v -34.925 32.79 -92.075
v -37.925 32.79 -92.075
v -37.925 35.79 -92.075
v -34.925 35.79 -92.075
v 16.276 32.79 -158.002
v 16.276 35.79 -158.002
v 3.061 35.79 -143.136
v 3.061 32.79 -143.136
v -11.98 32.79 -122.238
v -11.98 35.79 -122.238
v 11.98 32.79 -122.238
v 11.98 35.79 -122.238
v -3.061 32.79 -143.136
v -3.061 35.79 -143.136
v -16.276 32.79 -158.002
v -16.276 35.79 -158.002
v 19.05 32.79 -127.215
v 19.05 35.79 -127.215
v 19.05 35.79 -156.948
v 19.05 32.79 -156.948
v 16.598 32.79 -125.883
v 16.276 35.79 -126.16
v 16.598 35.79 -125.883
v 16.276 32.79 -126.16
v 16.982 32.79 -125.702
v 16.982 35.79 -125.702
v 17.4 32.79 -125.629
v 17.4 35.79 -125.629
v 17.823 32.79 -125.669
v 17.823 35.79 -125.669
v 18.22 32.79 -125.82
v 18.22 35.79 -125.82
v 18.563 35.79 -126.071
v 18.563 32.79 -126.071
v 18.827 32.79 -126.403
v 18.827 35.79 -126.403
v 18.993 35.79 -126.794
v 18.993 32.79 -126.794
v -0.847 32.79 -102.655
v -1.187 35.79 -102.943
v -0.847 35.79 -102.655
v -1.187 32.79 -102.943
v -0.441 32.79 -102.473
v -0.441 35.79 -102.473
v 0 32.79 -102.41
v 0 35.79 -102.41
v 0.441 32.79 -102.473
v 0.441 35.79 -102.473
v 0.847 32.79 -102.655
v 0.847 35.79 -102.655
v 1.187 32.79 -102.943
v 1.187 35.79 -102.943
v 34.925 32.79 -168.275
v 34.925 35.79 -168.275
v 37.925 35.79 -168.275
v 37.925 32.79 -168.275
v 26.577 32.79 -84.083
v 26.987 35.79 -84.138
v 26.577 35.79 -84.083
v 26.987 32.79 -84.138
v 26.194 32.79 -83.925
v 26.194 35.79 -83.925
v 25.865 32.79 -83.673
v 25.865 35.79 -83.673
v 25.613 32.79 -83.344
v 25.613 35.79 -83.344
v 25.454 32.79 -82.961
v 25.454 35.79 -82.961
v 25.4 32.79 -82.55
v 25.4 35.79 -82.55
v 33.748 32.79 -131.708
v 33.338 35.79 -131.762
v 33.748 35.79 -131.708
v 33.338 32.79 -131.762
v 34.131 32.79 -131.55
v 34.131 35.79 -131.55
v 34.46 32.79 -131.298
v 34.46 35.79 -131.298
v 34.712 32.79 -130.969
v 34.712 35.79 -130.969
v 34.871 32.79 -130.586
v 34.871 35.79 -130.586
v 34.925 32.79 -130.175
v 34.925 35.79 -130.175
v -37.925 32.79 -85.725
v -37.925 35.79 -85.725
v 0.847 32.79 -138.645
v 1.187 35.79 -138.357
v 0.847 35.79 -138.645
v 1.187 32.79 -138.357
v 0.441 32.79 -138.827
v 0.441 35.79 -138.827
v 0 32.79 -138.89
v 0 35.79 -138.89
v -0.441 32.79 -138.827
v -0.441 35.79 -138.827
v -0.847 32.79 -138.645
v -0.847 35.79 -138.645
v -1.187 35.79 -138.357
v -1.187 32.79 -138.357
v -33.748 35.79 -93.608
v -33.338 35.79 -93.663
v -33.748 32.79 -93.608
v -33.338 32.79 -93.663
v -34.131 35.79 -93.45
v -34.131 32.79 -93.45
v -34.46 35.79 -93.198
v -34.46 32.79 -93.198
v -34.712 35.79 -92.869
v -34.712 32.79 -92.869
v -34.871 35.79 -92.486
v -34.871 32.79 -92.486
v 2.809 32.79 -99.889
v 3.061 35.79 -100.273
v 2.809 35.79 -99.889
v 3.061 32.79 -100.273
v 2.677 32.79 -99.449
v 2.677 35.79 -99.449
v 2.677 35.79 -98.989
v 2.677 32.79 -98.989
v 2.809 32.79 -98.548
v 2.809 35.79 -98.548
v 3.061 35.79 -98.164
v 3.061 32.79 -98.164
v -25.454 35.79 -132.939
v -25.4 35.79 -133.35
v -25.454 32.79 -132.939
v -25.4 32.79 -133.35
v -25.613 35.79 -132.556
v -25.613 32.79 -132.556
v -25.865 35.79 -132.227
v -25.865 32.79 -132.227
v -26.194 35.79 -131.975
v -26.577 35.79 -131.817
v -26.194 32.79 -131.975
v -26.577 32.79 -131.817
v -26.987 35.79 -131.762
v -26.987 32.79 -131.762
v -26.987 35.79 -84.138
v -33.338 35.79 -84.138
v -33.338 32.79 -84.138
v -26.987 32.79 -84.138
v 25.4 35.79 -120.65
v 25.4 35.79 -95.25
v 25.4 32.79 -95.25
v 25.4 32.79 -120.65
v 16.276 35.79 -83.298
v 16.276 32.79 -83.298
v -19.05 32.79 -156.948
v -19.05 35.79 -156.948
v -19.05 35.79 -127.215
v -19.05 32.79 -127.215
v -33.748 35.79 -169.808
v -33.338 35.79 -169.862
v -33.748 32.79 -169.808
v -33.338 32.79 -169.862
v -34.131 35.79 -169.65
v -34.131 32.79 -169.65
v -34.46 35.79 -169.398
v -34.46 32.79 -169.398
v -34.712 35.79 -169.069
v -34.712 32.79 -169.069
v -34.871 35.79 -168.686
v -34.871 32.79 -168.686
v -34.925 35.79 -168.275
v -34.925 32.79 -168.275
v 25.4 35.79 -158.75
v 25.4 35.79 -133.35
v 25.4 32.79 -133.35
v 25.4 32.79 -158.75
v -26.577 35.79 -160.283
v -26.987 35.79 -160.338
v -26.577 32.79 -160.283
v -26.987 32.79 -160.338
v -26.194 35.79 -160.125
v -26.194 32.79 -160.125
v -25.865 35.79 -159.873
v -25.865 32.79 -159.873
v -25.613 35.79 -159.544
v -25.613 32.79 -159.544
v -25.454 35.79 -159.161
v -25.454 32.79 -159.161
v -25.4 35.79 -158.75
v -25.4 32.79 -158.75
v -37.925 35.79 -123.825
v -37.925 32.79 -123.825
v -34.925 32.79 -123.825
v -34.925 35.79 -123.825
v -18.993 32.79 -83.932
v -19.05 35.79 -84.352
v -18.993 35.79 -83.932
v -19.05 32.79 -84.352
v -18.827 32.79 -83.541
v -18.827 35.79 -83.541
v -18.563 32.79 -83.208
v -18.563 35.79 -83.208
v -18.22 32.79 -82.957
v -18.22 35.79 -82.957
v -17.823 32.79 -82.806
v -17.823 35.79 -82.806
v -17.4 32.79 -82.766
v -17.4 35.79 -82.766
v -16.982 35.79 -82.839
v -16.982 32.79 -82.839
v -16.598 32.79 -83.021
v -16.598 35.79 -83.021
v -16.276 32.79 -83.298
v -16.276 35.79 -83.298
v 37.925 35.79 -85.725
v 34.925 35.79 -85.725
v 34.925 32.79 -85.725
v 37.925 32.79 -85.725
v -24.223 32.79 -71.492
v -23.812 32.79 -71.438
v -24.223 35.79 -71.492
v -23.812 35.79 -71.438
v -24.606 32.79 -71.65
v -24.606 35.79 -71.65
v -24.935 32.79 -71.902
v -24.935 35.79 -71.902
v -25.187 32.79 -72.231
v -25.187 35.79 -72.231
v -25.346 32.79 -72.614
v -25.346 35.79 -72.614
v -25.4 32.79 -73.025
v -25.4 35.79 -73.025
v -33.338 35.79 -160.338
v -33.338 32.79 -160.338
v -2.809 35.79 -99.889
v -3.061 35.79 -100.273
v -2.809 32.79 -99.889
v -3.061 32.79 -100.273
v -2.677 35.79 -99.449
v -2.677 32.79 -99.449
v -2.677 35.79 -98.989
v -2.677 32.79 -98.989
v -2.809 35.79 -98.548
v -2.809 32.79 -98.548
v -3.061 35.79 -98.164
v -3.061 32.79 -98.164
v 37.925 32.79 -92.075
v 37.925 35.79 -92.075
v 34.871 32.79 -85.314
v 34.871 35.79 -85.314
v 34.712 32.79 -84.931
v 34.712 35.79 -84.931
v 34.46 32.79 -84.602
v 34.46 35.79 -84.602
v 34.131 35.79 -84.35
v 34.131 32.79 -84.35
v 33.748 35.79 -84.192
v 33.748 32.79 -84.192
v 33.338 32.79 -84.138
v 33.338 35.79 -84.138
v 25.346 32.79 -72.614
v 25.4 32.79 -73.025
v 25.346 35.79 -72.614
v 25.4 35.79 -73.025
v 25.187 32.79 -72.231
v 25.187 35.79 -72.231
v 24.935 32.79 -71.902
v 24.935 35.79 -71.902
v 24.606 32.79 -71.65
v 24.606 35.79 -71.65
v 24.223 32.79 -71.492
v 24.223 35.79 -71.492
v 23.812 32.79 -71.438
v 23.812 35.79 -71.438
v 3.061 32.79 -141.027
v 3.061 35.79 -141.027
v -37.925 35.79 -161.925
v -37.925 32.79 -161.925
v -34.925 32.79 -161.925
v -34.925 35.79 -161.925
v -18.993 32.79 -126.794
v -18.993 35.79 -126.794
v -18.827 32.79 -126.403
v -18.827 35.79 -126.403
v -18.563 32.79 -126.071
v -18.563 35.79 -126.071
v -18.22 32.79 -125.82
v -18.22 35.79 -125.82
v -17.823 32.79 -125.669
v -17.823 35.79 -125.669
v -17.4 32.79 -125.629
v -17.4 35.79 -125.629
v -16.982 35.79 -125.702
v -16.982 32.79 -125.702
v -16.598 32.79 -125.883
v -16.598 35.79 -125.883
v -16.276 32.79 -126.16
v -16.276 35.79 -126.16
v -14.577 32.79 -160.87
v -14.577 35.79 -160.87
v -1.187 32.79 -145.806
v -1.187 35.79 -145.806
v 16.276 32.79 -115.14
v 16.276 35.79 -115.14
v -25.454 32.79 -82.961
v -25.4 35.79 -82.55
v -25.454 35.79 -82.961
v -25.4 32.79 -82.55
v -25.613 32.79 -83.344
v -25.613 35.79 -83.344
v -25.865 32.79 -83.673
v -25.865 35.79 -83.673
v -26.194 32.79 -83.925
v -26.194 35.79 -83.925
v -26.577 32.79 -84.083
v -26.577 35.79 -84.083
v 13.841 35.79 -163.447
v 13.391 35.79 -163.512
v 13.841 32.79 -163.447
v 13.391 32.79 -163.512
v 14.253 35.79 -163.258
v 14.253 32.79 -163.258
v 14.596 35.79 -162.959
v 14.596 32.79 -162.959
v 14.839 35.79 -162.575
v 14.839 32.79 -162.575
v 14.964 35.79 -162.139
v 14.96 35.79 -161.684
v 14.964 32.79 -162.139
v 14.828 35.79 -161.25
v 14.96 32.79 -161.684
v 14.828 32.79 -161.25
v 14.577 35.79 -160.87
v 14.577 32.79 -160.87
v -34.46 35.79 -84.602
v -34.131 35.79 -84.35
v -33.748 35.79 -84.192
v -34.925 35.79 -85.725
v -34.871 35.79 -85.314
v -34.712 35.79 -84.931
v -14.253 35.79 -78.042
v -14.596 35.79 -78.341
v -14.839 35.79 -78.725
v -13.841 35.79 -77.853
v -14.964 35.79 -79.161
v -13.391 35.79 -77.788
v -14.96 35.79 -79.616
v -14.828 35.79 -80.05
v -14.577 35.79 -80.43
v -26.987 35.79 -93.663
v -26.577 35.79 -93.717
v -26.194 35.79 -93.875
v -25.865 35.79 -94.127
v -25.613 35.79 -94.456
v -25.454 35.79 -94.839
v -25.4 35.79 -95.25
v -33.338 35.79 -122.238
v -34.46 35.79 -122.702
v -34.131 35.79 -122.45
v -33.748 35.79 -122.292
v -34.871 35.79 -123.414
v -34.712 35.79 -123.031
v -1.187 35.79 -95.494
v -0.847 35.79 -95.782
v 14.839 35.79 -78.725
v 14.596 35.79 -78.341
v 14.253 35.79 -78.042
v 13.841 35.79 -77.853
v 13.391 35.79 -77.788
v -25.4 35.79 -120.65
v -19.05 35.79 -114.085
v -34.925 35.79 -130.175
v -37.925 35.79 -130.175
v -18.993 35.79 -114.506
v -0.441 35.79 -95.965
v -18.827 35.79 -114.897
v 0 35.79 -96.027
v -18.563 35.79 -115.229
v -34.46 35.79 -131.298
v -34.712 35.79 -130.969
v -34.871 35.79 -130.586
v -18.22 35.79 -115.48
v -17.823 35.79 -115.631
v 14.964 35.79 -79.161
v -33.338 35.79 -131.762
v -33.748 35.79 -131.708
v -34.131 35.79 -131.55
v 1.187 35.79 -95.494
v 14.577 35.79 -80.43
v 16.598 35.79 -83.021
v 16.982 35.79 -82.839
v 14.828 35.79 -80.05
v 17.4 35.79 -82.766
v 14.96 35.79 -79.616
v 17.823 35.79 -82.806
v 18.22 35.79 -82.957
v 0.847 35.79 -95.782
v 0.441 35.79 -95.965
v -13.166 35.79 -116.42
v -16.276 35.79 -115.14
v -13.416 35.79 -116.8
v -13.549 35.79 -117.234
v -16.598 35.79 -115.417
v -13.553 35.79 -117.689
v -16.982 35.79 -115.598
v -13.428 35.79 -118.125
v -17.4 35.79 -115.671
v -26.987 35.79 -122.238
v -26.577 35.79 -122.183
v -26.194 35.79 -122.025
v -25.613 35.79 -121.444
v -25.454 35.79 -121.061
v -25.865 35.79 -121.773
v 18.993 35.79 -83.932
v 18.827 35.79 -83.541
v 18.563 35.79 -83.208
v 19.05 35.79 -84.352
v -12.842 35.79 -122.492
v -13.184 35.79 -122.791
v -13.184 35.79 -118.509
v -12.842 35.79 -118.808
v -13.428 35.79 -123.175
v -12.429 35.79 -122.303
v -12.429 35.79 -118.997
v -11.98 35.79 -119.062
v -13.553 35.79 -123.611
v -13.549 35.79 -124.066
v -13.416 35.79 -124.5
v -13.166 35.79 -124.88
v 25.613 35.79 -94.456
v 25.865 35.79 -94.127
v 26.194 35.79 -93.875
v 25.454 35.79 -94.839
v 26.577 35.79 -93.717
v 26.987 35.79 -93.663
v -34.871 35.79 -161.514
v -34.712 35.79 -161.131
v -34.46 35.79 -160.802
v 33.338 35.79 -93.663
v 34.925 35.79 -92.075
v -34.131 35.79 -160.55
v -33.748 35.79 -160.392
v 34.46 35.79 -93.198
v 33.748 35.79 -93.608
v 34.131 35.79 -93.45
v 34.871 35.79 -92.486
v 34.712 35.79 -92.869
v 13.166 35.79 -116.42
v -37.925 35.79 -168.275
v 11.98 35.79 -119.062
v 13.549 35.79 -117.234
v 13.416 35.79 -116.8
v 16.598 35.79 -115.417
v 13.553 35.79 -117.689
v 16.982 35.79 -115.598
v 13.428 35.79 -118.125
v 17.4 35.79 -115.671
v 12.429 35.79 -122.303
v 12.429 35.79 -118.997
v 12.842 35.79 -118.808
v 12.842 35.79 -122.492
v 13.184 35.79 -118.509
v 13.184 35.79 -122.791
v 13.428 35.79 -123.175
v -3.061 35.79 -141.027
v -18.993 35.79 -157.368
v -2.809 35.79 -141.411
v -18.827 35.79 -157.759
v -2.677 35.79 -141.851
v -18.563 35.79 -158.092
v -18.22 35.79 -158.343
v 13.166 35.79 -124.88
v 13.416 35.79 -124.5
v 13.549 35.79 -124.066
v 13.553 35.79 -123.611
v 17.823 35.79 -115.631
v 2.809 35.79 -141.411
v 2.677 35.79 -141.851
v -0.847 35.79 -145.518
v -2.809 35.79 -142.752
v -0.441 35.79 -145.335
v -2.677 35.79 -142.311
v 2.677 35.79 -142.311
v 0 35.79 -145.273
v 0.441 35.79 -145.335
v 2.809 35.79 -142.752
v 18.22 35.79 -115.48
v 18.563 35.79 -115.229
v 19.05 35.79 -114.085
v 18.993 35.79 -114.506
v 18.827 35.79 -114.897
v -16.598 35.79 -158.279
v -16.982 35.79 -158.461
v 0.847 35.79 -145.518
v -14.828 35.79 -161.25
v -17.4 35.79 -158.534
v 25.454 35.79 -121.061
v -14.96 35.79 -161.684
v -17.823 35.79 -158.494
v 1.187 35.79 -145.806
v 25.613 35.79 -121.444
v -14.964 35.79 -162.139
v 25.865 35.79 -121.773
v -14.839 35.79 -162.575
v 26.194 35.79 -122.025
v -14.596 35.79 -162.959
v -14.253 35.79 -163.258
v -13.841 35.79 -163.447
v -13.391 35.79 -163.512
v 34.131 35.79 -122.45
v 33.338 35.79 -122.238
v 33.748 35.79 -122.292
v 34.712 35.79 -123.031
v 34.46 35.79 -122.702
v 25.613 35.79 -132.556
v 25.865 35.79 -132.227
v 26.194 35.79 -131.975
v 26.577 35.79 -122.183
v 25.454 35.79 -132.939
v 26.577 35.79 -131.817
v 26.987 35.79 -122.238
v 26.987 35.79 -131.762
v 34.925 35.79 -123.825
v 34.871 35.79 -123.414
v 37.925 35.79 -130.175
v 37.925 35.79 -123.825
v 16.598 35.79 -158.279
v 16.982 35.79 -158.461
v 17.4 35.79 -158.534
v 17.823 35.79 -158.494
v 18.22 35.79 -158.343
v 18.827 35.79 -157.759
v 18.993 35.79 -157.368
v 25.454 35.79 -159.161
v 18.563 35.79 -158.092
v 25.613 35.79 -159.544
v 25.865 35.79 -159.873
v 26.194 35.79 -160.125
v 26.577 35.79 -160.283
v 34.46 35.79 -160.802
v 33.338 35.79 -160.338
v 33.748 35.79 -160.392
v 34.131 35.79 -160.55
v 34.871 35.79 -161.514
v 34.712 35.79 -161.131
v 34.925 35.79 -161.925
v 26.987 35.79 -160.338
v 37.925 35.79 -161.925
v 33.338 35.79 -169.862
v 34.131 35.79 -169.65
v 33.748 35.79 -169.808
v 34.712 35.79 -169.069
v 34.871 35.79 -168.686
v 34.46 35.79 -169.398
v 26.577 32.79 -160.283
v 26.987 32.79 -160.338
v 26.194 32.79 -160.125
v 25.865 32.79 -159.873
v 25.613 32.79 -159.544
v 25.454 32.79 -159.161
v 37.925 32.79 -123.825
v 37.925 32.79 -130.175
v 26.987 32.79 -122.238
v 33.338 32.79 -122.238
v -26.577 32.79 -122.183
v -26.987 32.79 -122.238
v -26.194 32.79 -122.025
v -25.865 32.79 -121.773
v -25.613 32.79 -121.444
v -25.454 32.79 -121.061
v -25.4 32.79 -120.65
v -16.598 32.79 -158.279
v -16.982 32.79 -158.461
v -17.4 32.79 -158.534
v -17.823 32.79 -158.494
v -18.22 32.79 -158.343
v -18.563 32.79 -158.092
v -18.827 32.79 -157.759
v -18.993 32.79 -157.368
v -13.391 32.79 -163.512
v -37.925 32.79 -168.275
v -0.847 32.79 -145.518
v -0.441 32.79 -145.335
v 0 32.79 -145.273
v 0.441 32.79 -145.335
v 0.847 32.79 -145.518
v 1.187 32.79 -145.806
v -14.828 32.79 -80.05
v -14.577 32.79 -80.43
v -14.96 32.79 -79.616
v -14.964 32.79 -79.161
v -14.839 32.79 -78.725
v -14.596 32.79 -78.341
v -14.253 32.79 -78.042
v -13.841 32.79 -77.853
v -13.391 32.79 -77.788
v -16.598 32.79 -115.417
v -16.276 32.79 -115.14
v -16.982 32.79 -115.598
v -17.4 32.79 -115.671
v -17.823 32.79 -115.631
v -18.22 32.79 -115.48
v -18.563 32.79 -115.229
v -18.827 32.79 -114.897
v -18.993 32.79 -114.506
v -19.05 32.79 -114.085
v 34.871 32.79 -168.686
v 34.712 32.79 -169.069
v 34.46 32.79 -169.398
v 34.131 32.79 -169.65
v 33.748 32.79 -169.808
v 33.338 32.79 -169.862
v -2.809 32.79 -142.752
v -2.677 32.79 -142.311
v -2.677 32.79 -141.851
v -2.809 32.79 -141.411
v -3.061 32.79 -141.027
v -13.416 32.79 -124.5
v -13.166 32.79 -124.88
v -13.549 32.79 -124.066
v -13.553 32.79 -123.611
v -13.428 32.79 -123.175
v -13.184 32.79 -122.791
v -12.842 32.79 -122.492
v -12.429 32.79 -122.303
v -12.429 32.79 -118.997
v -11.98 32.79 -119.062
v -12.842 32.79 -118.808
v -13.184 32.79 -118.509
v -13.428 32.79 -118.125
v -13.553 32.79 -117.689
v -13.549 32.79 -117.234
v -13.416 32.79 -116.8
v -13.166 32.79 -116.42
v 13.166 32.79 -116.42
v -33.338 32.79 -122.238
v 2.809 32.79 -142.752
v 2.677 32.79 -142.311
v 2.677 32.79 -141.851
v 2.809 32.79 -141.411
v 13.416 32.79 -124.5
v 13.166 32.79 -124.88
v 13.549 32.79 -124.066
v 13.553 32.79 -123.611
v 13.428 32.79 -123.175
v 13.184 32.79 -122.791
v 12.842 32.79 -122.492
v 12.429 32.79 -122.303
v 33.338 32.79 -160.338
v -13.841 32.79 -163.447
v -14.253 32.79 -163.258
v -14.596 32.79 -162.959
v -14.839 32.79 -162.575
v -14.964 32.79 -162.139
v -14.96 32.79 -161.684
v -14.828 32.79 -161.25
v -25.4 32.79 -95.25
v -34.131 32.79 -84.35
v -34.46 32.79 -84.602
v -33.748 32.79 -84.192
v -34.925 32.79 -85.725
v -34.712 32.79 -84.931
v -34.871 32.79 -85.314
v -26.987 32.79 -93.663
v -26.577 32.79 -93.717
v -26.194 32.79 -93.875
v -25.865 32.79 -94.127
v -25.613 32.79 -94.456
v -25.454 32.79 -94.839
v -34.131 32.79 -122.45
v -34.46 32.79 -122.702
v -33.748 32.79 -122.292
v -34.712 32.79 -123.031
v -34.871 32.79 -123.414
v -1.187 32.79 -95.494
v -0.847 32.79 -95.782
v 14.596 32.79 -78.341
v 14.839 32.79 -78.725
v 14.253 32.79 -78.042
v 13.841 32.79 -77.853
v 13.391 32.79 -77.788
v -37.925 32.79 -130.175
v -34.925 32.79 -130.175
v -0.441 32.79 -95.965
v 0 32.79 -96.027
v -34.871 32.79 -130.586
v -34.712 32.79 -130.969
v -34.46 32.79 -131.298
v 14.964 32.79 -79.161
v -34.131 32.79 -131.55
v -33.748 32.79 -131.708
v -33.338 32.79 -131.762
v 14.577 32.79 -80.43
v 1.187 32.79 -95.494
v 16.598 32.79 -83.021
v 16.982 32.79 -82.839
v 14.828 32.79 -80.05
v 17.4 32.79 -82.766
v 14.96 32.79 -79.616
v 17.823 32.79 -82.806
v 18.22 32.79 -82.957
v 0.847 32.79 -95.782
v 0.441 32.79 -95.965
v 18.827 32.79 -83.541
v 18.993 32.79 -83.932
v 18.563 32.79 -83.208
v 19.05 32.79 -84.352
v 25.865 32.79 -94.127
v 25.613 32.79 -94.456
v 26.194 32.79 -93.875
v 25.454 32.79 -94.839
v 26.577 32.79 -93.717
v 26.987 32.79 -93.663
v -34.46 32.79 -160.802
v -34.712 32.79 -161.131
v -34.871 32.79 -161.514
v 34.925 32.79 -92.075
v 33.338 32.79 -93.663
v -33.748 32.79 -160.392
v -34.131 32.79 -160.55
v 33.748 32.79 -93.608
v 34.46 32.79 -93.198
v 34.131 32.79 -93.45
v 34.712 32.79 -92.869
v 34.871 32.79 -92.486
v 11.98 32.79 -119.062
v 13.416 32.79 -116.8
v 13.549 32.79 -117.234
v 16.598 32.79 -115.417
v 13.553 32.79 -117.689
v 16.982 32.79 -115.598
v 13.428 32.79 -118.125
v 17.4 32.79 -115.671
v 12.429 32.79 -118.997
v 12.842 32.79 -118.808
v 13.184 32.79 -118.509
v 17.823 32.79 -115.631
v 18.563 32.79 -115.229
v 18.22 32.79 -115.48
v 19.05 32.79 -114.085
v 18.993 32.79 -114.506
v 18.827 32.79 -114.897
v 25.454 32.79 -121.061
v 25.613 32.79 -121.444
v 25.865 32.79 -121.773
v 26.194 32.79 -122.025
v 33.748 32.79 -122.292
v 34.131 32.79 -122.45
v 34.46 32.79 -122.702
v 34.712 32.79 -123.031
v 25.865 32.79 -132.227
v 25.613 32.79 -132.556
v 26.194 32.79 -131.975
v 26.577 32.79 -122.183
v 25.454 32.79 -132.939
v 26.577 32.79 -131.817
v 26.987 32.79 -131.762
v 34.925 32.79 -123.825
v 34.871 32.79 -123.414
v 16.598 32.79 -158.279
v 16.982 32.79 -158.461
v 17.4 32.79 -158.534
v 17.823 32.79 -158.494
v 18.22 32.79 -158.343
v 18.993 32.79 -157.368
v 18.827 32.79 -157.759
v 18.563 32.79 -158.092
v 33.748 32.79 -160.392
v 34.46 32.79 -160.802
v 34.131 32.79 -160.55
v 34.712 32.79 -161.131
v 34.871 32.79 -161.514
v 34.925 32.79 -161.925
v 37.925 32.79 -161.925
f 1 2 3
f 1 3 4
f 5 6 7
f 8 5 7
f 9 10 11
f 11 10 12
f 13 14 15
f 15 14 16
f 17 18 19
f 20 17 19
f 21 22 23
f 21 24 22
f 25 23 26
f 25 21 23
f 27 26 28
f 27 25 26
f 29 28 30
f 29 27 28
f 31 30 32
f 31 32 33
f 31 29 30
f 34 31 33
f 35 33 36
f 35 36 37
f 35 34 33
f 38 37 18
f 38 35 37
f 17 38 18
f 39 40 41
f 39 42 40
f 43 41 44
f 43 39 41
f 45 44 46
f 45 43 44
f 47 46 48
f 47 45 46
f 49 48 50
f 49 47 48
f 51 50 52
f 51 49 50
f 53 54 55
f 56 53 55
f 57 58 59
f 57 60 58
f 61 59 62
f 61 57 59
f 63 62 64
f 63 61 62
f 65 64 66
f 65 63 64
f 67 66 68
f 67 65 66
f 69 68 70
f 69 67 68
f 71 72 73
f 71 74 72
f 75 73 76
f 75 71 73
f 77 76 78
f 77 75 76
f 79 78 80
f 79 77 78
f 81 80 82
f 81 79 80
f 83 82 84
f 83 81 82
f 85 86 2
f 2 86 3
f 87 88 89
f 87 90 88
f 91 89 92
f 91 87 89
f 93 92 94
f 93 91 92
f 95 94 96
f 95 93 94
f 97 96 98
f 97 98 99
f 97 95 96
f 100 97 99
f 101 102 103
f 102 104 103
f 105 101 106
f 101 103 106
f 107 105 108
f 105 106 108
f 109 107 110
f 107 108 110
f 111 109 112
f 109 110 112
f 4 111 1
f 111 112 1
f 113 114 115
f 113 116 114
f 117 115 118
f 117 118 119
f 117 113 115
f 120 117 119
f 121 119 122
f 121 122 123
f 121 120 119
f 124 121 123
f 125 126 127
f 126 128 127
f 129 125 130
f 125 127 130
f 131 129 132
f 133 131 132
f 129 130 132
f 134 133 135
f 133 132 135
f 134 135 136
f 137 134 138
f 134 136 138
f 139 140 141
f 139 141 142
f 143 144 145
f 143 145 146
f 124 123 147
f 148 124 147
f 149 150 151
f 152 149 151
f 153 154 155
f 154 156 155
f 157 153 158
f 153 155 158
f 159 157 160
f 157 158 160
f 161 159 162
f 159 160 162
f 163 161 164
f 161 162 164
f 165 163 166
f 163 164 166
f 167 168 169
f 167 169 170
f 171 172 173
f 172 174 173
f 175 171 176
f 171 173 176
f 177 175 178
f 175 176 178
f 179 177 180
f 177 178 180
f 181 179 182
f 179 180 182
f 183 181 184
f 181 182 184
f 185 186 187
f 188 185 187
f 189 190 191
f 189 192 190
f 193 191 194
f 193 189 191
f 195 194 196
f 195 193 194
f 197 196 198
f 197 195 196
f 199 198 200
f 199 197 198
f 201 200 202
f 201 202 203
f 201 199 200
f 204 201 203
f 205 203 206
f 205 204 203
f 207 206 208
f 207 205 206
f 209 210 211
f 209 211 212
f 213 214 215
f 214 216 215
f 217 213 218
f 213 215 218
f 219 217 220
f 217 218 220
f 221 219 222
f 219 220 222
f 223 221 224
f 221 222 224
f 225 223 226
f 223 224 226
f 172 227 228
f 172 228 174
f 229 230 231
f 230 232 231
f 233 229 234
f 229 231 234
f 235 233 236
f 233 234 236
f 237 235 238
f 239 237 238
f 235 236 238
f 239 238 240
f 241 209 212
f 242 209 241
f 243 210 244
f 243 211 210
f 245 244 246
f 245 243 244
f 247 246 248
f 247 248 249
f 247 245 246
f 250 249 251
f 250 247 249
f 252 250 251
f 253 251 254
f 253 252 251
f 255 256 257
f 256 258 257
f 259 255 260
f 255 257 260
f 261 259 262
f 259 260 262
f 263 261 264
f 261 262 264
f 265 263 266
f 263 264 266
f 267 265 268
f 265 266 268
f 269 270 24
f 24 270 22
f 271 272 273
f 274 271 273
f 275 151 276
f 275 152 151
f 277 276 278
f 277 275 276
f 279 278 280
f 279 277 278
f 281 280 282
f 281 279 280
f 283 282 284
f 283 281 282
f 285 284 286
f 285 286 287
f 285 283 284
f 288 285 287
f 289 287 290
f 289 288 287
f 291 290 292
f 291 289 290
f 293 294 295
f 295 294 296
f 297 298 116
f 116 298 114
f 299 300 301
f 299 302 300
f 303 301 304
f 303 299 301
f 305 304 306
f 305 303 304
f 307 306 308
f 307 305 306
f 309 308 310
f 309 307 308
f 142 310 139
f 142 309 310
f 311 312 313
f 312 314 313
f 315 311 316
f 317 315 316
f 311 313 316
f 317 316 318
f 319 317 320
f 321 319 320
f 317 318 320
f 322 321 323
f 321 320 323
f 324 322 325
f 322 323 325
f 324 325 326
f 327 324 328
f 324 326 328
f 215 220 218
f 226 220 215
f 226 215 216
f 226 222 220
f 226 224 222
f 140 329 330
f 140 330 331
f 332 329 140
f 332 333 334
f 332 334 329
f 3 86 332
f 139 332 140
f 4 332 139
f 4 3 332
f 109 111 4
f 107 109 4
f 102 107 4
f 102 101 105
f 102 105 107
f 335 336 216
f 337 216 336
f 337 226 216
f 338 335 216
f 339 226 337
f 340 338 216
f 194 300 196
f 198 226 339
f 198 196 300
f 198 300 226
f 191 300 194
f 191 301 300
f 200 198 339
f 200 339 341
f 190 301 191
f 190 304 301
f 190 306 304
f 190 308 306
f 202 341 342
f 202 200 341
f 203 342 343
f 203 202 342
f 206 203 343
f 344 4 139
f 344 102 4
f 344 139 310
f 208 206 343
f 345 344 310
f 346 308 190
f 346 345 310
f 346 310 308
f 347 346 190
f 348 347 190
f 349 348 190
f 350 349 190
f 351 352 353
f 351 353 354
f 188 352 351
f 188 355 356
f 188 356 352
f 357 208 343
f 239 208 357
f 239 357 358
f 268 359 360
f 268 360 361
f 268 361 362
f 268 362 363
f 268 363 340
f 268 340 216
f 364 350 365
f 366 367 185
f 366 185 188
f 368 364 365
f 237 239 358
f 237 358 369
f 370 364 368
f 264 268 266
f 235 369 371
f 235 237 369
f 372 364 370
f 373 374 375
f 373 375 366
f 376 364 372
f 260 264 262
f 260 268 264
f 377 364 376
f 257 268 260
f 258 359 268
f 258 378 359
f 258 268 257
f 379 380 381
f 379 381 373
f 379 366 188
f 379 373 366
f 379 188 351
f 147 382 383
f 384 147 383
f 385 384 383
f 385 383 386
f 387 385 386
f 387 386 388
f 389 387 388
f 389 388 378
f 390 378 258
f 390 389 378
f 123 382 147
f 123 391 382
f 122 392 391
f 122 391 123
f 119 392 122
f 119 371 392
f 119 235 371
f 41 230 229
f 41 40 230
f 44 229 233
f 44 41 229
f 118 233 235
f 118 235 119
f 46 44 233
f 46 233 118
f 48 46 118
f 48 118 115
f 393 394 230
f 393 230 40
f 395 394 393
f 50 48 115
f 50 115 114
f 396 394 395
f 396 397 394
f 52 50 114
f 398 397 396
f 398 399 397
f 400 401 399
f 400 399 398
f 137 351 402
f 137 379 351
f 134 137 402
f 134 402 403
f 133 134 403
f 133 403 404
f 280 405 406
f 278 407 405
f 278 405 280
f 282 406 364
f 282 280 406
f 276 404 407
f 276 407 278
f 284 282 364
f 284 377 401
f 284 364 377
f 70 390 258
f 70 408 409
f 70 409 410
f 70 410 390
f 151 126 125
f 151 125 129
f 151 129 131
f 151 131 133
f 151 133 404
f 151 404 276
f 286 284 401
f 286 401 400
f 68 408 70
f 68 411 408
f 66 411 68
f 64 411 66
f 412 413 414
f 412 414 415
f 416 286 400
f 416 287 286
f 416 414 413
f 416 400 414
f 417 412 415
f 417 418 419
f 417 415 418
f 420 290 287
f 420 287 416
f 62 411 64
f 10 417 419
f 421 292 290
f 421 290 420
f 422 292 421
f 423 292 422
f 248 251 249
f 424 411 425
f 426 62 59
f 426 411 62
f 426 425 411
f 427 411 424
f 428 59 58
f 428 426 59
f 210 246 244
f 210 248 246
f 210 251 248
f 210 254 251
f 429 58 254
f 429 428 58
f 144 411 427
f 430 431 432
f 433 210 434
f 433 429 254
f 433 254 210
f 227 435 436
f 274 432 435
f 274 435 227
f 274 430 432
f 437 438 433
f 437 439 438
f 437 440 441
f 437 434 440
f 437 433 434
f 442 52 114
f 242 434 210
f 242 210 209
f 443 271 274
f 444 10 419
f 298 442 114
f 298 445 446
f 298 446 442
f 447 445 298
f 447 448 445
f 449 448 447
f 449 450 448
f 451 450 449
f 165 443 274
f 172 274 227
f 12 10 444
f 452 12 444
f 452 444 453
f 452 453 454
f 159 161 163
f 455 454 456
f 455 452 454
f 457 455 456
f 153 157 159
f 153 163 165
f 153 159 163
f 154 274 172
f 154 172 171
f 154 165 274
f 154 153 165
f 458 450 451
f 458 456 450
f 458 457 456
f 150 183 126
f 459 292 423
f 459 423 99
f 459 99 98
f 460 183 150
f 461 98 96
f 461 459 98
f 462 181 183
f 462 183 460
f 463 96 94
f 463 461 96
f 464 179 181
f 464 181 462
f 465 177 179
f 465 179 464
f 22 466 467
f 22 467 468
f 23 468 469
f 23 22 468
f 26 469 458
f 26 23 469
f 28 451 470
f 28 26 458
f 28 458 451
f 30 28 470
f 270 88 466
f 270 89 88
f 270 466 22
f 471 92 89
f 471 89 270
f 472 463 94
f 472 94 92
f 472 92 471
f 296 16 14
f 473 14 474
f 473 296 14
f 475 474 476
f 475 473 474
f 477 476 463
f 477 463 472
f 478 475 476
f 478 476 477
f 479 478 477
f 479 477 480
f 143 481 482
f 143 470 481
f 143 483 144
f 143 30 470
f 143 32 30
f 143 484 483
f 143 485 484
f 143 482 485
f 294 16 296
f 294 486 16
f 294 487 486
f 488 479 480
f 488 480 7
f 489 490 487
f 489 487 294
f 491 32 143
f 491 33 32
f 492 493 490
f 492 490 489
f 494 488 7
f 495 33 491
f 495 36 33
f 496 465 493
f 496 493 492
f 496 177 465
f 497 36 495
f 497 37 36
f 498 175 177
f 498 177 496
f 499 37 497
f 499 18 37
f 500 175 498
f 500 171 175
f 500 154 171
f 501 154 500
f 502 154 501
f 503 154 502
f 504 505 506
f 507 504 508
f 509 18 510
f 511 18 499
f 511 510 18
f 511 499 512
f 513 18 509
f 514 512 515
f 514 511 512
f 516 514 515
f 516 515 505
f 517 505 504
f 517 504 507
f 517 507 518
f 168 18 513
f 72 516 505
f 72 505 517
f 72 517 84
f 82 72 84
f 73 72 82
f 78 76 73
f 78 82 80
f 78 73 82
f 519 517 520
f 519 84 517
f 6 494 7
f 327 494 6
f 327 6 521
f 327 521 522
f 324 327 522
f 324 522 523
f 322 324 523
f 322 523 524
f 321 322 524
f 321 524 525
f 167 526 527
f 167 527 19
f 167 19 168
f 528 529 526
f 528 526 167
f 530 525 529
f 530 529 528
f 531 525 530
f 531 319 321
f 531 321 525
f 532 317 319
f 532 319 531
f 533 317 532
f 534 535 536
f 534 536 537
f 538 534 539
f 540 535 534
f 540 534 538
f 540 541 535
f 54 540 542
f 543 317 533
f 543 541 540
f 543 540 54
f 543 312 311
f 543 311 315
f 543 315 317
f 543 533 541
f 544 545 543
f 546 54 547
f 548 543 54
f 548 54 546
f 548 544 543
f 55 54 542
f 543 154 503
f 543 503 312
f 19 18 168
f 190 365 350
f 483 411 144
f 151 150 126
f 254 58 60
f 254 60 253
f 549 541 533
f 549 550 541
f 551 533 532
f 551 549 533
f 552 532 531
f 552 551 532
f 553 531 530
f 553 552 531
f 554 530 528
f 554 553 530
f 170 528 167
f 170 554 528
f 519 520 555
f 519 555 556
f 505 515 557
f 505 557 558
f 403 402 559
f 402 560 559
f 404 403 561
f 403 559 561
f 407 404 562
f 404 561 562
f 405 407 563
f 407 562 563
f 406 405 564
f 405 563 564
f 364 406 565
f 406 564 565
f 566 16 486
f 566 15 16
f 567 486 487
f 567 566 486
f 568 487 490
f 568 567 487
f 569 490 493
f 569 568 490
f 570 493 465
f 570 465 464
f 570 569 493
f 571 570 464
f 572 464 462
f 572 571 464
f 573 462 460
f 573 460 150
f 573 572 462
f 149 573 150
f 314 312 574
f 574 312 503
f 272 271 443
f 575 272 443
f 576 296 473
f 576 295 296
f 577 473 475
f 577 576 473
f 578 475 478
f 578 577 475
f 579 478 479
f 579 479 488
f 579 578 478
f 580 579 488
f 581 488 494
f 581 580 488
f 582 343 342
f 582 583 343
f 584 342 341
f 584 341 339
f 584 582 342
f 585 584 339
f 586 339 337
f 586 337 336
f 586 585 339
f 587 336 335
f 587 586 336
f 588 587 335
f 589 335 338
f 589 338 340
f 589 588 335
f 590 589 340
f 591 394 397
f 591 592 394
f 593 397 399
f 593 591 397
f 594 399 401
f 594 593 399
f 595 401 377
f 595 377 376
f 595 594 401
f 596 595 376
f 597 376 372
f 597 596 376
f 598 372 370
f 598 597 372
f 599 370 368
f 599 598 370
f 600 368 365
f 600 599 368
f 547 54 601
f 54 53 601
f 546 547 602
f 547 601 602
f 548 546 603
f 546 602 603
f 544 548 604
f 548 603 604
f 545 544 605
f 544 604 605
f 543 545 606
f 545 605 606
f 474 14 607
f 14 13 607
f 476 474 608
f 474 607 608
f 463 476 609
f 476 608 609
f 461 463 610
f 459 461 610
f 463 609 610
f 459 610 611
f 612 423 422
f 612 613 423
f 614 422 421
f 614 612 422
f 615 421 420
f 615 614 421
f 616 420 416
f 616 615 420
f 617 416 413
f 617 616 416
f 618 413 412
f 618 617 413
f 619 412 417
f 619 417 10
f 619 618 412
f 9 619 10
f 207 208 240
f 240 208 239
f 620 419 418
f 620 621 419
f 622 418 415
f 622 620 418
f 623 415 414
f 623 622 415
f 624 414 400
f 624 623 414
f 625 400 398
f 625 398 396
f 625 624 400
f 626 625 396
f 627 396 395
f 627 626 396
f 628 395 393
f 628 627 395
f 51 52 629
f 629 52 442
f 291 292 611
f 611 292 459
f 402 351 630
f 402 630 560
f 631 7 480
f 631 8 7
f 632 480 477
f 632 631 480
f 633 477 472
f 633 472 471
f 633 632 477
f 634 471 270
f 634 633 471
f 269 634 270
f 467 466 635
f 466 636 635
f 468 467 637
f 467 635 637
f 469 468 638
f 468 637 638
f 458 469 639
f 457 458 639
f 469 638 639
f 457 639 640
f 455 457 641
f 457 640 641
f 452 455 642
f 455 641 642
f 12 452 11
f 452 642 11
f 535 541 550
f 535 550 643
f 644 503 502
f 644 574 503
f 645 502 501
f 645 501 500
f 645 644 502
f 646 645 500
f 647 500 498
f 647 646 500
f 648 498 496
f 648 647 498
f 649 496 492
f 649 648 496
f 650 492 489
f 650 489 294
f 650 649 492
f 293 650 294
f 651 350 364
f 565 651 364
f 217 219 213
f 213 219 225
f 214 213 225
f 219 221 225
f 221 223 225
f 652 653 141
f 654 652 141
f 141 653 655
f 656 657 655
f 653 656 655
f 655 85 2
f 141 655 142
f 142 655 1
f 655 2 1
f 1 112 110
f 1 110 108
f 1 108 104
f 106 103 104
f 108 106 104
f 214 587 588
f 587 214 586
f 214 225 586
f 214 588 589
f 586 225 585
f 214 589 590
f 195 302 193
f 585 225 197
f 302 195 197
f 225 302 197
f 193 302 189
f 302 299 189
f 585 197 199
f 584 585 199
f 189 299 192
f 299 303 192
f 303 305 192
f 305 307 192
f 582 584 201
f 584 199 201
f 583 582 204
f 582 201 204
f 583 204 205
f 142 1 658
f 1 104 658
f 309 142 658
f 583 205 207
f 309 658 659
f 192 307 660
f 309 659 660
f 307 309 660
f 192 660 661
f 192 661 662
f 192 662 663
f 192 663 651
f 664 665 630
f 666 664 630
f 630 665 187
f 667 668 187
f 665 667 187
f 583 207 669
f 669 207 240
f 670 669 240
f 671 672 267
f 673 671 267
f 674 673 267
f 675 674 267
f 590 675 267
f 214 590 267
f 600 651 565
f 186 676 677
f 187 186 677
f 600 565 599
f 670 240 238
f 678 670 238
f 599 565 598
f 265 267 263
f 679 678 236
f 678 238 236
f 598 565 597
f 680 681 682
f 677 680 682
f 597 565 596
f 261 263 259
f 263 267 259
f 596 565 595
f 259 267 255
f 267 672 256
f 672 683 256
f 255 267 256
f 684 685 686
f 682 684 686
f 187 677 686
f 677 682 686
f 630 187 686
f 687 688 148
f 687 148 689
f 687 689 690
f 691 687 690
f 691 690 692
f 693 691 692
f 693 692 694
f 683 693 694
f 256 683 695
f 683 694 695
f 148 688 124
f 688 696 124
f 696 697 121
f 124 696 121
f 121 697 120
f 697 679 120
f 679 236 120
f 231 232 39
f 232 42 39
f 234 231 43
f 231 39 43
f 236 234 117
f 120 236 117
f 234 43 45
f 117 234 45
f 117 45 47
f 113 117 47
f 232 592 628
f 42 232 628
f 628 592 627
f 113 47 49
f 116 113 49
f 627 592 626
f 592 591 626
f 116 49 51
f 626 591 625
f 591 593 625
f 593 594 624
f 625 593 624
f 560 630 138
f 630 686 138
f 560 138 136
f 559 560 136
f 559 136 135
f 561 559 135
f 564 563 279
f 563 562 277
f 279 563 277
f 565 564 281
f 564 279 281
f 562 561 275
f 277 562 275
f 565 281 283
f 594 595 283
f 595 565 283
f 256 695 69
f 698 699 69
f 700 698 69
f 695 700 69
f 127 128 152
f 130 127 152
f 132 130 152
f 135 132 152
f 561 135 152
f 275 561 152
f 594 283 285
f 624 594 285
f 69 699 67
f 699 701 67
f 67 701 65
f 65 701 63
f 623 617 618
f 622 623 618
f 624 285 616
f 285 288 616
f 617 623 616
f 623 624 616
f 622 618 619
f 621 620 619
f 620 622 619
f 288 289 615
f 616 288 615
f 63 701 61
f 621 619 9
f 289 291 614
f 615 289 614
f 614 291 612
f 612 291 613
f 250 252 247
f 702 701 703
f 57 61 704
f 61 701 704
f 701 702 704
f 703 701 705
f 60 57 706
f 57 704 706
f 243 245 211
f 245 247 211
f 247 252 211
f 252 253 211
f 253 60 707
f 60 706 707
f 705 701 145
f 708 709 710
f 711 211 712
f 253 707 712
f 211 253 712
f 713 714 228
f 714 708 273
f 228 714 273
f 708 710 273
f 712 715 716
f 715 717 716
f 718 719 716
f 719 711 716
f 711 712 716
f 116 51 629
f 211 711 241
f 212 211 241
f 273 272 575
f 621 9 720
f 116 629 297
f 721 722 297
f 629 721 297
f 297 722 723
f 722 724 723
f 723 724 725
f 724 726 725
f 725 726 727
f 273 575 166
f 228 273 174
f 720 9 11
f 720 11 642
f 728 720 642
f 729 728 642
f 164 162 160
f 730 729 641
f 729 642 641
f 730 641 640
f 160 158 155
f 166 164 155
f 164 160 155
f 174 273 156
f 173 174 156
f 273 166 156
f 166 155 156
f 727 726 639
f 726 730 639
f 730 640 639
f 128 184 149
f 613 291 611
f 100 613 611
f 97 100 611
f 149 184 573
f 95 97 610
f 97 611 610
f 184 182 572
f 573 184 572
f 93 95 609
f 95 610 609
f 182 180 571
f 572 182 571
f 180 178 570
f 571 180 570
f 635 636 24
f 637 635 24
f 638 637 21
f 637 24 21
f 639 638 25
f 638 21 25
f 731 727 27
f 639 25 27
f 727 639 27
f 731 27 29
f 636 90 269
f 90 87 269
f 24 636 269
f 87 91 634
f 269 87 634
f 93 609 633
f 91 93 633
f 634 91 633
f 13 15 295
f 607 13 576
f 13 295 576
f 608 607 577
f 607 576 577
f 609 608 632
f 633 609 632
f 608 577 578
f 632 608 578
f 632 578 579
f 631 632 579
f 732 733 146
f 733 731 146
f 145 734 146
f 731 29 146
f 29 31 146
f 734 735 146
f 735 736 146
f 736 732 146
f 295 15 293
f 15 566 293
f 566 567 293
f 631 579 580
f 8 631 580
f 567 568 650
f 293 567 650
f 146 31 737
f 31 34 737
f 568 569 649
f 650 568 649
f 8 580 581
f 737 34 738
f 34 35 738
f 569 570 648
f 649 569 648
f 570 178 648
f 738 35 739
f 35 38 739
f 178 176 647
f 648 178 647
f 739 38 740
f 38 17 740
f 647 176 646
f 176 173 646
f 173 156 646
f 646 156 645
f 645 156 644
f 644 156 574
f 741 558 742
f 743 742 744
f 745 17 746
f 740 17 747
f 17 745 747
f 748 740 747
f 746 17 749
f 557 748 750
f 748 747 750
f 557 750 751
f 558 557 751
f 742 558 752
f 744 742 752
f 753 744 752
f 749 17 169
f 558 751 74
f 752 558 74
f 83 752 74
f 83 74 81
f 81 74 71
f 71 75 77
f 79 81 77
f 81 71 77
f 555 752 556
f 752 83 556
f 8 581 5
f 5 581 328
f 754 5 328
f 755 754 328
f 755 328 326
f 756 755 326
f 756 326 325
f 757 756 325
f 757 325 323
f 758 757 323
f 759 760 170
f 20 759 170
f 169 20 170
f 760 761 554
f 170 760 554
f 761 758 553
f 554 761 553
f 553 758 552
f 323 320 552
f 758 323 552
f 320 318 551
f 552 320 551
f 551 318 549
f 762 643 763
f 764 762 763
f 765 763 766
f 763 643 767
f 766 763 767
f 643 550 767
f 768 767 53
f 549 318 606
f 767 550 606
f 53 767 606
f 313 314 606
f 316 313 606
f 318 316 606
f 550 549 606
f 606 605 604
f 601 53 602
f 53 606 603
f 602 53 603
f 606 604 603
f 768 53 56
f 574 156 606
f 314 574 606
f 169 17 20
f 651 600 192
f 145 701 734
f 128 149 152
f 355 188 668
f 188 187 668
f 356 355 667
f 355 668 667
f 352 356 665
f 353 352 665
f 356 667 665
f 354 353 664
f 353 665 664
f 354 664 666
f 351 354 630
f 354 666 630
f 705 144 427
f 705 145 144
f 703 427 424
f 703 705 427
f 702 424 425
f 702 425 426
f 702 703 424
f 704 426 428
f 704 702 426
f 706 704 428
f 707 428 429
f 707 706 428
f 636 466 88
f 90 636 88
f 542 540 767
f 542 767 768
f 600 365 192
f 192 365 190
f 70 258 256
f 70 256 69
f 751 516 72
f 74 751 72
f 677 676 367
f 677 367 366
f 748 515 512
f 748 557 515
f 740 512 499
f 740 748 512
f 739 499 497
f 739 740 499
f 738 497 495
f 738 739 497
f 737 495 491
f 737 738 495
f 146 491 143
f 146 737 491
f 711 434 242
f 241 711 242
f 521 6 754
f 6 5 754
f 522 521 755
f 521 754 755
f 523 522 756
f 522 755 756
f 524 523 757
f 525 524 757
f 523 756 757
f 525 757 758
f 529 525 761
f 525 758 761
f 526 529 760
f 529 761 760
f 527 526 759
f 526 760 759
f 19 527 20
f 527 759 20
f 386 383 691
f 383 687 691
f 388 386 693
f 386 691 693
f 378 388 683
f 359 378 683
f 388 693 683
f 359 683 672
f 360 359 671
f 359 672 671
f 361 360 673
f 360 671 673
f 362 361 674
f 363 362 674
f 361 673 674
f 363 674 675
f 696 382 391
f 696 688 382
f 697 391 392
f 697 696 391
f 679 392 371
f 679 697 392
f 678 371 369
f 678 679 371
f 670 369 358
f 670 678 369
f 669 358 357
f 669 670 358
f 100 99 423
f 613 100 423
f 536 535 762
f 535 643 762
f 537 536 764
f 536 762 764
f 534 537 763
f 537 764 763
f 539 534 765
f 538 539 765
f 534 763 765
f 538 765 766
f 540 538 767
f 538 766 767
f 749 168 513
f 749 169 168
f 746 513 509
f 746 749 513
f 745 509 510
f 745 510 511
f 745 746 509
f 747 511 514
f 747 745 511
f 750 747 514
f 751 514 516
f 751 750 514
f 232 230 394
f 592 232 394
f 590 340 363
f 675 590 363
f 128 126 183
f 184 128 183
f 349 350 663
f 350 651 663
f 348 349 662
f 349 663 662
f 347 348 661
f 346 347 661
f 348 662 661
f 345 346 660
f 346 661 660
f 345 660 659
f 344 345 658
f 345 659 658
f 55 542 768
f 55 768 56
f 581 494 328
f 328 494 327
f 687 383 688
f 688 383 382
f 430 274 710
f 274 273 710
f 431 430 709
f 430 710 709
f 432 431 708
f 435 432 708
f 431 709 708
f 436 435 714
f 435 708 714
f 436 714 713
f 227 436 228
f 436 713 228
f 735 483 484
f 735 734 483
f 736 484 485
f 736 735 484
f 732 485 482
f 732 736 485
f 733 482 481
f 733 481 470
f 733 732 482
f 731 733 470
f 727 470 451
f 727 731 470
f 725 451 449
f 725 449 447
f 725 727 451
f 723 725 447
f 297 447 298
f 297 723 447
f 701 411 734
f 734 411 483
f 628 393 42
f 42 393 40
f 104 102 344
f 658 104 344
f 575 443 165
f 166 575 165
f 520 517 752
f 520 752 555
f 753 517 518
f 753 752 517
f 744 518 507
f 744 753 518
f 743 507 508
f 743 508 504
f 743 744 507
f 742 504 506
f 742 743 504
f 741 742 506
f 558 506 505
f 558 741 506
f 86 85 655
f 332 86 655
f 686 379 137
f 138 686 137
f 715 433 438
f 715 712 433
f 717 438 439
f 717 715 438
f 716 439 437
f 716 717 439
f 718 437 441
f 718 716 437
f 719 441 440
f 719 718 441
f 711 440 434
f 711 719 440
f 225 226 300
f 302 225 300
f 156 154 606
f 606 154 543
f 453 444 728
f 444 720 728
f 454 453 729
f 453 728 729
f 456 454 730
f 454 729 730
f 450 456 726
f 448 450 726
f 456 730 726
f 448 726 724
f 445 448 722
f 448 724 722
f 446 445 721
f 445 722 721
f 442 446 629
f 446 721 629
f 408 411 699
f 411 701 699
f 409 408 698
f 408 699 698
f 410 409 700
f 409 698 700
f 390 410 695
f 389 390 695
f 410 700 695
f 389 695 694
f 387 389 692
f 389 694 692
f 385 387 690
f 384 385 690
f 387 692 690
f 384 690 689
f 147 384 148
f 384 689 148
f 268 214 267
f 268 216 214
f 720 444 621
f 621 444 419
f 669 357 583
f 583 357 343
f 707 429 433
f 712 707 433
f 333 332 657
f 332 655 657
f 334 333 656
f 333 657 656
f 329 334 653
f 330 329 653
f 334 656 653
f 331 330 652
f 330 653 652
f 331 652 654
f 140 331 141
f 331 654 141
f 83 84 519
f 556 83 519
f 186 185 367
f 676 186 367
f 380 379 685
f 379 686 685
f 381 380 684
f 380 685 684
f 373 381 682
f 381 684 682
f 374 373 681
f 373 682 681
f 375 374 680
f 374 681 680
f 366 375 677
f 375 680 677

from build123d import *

# Parameters (mm, degrees)
SKETCH1_W           = 50.8
SKETCH1_H           = 98.425
BOSS_EXTRUDE1_DEPTH = 1.5
SKETCH2_W           = 9.525
SKETCH2_H           = 9.525
BOSS_EXTRUDE2_DEPTH = 3
CUT_EXTRUDE1_DEPTH  = 3
FILLET1_R           = 1.5875
SKETCH5_W           = 3
SKETCH5_H           = 6.35
BOSS_EXTRUDE3_DEPTH = 3


with BuildPart() as part:
    # Sketch1 → Boss-Extrude1 (new, symmetric)
    with BuildSketch(Plane(origin=(0, 34.29, 0), x_dir=(1, 0, 0), z_dir=(0, 1, 0))):
        with Locations((0, 120.65)):
            Rectangle(SKETCH1_W, SKETCH1_H)
    extrude(amount=BOSS_EXTRUDE1_DEPTH, both=True)

    # Sketch2 → Boss-Extrude2 (add)
    with BuildSketch(Plane(origin=(0, 35.79, 0), x_dir=(1, 0, 0), z_dir=(0, 1, 0))):
        with Locations((30.1625, 165.1)):
            Rectangle(SKETCH2_W, SKETCH2_H)
        with Locations((-30.1625, 165.1)):
            Rectangle(SKETCH2_W, SKETCH2_H)
        with Locations((30.1625, 127)):
            Rectangle(SKETCH2_W, SKETCH2_H)
        with Locations((-30.1625, 127)):
            Rectangle(SKETCH2_W, SKETCH2_H)
        with Locations((30.1625, 88.9)):
            Rectangle(SKETCH2_W, SKETCH2_H)
        with Locations((-30.1625, 88.9)):
            Rectangle(SKETCH2_W, SKETCH2_H)
    extrude(amount=-BOSS_EXTRUDE2_DEPTH)

    # Sketch4 → Cut-Extrude1 (cut)
    with BuildSketch(Plane(origin=(0, 35.79, 0), x_dir=(1, 0, 0), z_dir=(0, 1, 0))):
        Polygon((16.925996512, 163.5125), (-16.925996512, 163.5125), (0, 144.470753924), align=None)
        Polygon((-2.124003488, 142.08125), (-19.05, 161.122996076), (-19.05, 123.039503924), align=None)
        Polygon((19.05, 161.122996076), (2.124003488, 142.08125), (19.05, 123.039503924), align=None)
        Polygon((15.514885401, 122.2375), (0, 139.691746076), (-15.514885401, 122.2375), align=None)
        Polygon((-2.124003488, 99.21875), (-19.05, 118.260496076), (-19.05, 80.177003924), align=None)
        Polygon((15.514885401, 119.0625), (-15.514885401, 119.0625), (0, 101.608253924), align=None)
        Polygon((19.05, 80.177003924), (19.05, 118.260496076), (2.124003488, 99.21875), align=None)
        Polygon((16.925996512, 77.7875), (0, 96.829246076), (-16.925996512, 77.7875), align=None)
    extrude(amount=-CUT_EXTRUDE1_DEPTH, mode=Mode.SUBTRACT)

    # Fillet1
    fillet1_edges = [part.edges().sort_by_distance(p)[0] for p in [
        (15.514885401, 34.29, -122.2375),
        (-15.514885401, 34.29, -122.2375),
        (0, 34.29, -139.691746076),
        (15.514885401, 34.29, -119.0625),
        (0, 34.29, -101.608253924),
        (-15.514885401, 34.29, -119.0625),
        (16.925996512, 34.29, -77.7875),
        (-16.925996512, 34.29, -77.7875),
        (0, 34.29, -96.829246076),
        (-2.124003488, 34.29, -99.21875),
        (-19.05, 34.29, -80.177003924),
        (-19.05, 34.29, -118.260496076),
        (-2.124003488, 34.29, -142.08125),
        (-19.05, 34.29, -123.039503924),
        (-19.05, 34.29, -161.122996076),
        (19.05, 34.29, -123.039503924),
        (2.124003488, 34.29, -142.08125),
        (19.05, 34.29, -161.122996076),
        (0, 34.29, -144.470753924),
        (-16.925996512, 34.29, -163.5125),
        (16.925996512, 34.29, -163.5125),
        (19.05, 34.29, -118.260496076),
        (19.05, 34.29, -80.177003924),
        (2.124003488, 34.29, -99.21875),
        (34.925, 34.29, -84.1375),
        (34.925, 34.29, -93.6625),
        (25.4, 34.29, -93.6625),
        (25.4, 34.29, -84.1375),
        (-25.4, 34.29, -122.2375),
        (-25.4, 34.29, -131.7625),
        (-34.925, 34.29, -131.7625),
        (-34.925, 34.29, -122.2375),
        (34.925, 34.29, -122.2375),
        (34.925, 34.29, -131.7625),
        (25.4, 34.29, -131.7625),
        (25.4, 34.29, -122.2375),
        (-25.4, 34.29, -160.3375),
        (-34.925, 34.29, -169.8625),
        (-34.925, 34.29, -160.3375),
        (-25.4, 34.29, -84.1375),
        (-25.4, 34.29, -93.6625),
        (-34.925, 34.29, -93.6625),
        (-34.925, 34.29, -84.1375),
        (34.925, 34.29, -160.3375),
        (34.925, 34.29, -169.8625),
        (25.4, 34.29, -160.3375),
        (-25.4, 34.29, -71.4375),
        (25.4, 34.29, -71.4375),
    ]]
    fillet(fillet1_edges, radius=FILLET1_R)

    # Sketch5 → Boss-Extrude3 (add)
    with BuildSketch(Plane(origin=(0, 35.79, 0), x_dir=(1, 0, 0), z_dir=(0, 1, 0))):
        with Locations((36.425, 165.1)):
            Rectangle(SKETCH5_W, SKETCH5_H)
        with Locations((-36.425, 165.1)):
            Rectangle(SKETCH5_W, SKETCH5_H)
        with Locations((36.425, 127)):
            Rectangle(SKETCH5_W, SKETCH5_H)
        with Locations((-36.425, 127)):
            Rectangle(SKETCH5_W, SKETCH5_H)
        with Locations((36.425, 88.9)):
            Rectangle(SKETCH5_W, SKETCH5_H)
        with Locations((-36.425, 88.9)):
            Rectangle(SKETCH5_W, SKETCH5_H)
    extrude(amount=-BOSS_EXTRUDE3_DEPTH)


solid = part.part
